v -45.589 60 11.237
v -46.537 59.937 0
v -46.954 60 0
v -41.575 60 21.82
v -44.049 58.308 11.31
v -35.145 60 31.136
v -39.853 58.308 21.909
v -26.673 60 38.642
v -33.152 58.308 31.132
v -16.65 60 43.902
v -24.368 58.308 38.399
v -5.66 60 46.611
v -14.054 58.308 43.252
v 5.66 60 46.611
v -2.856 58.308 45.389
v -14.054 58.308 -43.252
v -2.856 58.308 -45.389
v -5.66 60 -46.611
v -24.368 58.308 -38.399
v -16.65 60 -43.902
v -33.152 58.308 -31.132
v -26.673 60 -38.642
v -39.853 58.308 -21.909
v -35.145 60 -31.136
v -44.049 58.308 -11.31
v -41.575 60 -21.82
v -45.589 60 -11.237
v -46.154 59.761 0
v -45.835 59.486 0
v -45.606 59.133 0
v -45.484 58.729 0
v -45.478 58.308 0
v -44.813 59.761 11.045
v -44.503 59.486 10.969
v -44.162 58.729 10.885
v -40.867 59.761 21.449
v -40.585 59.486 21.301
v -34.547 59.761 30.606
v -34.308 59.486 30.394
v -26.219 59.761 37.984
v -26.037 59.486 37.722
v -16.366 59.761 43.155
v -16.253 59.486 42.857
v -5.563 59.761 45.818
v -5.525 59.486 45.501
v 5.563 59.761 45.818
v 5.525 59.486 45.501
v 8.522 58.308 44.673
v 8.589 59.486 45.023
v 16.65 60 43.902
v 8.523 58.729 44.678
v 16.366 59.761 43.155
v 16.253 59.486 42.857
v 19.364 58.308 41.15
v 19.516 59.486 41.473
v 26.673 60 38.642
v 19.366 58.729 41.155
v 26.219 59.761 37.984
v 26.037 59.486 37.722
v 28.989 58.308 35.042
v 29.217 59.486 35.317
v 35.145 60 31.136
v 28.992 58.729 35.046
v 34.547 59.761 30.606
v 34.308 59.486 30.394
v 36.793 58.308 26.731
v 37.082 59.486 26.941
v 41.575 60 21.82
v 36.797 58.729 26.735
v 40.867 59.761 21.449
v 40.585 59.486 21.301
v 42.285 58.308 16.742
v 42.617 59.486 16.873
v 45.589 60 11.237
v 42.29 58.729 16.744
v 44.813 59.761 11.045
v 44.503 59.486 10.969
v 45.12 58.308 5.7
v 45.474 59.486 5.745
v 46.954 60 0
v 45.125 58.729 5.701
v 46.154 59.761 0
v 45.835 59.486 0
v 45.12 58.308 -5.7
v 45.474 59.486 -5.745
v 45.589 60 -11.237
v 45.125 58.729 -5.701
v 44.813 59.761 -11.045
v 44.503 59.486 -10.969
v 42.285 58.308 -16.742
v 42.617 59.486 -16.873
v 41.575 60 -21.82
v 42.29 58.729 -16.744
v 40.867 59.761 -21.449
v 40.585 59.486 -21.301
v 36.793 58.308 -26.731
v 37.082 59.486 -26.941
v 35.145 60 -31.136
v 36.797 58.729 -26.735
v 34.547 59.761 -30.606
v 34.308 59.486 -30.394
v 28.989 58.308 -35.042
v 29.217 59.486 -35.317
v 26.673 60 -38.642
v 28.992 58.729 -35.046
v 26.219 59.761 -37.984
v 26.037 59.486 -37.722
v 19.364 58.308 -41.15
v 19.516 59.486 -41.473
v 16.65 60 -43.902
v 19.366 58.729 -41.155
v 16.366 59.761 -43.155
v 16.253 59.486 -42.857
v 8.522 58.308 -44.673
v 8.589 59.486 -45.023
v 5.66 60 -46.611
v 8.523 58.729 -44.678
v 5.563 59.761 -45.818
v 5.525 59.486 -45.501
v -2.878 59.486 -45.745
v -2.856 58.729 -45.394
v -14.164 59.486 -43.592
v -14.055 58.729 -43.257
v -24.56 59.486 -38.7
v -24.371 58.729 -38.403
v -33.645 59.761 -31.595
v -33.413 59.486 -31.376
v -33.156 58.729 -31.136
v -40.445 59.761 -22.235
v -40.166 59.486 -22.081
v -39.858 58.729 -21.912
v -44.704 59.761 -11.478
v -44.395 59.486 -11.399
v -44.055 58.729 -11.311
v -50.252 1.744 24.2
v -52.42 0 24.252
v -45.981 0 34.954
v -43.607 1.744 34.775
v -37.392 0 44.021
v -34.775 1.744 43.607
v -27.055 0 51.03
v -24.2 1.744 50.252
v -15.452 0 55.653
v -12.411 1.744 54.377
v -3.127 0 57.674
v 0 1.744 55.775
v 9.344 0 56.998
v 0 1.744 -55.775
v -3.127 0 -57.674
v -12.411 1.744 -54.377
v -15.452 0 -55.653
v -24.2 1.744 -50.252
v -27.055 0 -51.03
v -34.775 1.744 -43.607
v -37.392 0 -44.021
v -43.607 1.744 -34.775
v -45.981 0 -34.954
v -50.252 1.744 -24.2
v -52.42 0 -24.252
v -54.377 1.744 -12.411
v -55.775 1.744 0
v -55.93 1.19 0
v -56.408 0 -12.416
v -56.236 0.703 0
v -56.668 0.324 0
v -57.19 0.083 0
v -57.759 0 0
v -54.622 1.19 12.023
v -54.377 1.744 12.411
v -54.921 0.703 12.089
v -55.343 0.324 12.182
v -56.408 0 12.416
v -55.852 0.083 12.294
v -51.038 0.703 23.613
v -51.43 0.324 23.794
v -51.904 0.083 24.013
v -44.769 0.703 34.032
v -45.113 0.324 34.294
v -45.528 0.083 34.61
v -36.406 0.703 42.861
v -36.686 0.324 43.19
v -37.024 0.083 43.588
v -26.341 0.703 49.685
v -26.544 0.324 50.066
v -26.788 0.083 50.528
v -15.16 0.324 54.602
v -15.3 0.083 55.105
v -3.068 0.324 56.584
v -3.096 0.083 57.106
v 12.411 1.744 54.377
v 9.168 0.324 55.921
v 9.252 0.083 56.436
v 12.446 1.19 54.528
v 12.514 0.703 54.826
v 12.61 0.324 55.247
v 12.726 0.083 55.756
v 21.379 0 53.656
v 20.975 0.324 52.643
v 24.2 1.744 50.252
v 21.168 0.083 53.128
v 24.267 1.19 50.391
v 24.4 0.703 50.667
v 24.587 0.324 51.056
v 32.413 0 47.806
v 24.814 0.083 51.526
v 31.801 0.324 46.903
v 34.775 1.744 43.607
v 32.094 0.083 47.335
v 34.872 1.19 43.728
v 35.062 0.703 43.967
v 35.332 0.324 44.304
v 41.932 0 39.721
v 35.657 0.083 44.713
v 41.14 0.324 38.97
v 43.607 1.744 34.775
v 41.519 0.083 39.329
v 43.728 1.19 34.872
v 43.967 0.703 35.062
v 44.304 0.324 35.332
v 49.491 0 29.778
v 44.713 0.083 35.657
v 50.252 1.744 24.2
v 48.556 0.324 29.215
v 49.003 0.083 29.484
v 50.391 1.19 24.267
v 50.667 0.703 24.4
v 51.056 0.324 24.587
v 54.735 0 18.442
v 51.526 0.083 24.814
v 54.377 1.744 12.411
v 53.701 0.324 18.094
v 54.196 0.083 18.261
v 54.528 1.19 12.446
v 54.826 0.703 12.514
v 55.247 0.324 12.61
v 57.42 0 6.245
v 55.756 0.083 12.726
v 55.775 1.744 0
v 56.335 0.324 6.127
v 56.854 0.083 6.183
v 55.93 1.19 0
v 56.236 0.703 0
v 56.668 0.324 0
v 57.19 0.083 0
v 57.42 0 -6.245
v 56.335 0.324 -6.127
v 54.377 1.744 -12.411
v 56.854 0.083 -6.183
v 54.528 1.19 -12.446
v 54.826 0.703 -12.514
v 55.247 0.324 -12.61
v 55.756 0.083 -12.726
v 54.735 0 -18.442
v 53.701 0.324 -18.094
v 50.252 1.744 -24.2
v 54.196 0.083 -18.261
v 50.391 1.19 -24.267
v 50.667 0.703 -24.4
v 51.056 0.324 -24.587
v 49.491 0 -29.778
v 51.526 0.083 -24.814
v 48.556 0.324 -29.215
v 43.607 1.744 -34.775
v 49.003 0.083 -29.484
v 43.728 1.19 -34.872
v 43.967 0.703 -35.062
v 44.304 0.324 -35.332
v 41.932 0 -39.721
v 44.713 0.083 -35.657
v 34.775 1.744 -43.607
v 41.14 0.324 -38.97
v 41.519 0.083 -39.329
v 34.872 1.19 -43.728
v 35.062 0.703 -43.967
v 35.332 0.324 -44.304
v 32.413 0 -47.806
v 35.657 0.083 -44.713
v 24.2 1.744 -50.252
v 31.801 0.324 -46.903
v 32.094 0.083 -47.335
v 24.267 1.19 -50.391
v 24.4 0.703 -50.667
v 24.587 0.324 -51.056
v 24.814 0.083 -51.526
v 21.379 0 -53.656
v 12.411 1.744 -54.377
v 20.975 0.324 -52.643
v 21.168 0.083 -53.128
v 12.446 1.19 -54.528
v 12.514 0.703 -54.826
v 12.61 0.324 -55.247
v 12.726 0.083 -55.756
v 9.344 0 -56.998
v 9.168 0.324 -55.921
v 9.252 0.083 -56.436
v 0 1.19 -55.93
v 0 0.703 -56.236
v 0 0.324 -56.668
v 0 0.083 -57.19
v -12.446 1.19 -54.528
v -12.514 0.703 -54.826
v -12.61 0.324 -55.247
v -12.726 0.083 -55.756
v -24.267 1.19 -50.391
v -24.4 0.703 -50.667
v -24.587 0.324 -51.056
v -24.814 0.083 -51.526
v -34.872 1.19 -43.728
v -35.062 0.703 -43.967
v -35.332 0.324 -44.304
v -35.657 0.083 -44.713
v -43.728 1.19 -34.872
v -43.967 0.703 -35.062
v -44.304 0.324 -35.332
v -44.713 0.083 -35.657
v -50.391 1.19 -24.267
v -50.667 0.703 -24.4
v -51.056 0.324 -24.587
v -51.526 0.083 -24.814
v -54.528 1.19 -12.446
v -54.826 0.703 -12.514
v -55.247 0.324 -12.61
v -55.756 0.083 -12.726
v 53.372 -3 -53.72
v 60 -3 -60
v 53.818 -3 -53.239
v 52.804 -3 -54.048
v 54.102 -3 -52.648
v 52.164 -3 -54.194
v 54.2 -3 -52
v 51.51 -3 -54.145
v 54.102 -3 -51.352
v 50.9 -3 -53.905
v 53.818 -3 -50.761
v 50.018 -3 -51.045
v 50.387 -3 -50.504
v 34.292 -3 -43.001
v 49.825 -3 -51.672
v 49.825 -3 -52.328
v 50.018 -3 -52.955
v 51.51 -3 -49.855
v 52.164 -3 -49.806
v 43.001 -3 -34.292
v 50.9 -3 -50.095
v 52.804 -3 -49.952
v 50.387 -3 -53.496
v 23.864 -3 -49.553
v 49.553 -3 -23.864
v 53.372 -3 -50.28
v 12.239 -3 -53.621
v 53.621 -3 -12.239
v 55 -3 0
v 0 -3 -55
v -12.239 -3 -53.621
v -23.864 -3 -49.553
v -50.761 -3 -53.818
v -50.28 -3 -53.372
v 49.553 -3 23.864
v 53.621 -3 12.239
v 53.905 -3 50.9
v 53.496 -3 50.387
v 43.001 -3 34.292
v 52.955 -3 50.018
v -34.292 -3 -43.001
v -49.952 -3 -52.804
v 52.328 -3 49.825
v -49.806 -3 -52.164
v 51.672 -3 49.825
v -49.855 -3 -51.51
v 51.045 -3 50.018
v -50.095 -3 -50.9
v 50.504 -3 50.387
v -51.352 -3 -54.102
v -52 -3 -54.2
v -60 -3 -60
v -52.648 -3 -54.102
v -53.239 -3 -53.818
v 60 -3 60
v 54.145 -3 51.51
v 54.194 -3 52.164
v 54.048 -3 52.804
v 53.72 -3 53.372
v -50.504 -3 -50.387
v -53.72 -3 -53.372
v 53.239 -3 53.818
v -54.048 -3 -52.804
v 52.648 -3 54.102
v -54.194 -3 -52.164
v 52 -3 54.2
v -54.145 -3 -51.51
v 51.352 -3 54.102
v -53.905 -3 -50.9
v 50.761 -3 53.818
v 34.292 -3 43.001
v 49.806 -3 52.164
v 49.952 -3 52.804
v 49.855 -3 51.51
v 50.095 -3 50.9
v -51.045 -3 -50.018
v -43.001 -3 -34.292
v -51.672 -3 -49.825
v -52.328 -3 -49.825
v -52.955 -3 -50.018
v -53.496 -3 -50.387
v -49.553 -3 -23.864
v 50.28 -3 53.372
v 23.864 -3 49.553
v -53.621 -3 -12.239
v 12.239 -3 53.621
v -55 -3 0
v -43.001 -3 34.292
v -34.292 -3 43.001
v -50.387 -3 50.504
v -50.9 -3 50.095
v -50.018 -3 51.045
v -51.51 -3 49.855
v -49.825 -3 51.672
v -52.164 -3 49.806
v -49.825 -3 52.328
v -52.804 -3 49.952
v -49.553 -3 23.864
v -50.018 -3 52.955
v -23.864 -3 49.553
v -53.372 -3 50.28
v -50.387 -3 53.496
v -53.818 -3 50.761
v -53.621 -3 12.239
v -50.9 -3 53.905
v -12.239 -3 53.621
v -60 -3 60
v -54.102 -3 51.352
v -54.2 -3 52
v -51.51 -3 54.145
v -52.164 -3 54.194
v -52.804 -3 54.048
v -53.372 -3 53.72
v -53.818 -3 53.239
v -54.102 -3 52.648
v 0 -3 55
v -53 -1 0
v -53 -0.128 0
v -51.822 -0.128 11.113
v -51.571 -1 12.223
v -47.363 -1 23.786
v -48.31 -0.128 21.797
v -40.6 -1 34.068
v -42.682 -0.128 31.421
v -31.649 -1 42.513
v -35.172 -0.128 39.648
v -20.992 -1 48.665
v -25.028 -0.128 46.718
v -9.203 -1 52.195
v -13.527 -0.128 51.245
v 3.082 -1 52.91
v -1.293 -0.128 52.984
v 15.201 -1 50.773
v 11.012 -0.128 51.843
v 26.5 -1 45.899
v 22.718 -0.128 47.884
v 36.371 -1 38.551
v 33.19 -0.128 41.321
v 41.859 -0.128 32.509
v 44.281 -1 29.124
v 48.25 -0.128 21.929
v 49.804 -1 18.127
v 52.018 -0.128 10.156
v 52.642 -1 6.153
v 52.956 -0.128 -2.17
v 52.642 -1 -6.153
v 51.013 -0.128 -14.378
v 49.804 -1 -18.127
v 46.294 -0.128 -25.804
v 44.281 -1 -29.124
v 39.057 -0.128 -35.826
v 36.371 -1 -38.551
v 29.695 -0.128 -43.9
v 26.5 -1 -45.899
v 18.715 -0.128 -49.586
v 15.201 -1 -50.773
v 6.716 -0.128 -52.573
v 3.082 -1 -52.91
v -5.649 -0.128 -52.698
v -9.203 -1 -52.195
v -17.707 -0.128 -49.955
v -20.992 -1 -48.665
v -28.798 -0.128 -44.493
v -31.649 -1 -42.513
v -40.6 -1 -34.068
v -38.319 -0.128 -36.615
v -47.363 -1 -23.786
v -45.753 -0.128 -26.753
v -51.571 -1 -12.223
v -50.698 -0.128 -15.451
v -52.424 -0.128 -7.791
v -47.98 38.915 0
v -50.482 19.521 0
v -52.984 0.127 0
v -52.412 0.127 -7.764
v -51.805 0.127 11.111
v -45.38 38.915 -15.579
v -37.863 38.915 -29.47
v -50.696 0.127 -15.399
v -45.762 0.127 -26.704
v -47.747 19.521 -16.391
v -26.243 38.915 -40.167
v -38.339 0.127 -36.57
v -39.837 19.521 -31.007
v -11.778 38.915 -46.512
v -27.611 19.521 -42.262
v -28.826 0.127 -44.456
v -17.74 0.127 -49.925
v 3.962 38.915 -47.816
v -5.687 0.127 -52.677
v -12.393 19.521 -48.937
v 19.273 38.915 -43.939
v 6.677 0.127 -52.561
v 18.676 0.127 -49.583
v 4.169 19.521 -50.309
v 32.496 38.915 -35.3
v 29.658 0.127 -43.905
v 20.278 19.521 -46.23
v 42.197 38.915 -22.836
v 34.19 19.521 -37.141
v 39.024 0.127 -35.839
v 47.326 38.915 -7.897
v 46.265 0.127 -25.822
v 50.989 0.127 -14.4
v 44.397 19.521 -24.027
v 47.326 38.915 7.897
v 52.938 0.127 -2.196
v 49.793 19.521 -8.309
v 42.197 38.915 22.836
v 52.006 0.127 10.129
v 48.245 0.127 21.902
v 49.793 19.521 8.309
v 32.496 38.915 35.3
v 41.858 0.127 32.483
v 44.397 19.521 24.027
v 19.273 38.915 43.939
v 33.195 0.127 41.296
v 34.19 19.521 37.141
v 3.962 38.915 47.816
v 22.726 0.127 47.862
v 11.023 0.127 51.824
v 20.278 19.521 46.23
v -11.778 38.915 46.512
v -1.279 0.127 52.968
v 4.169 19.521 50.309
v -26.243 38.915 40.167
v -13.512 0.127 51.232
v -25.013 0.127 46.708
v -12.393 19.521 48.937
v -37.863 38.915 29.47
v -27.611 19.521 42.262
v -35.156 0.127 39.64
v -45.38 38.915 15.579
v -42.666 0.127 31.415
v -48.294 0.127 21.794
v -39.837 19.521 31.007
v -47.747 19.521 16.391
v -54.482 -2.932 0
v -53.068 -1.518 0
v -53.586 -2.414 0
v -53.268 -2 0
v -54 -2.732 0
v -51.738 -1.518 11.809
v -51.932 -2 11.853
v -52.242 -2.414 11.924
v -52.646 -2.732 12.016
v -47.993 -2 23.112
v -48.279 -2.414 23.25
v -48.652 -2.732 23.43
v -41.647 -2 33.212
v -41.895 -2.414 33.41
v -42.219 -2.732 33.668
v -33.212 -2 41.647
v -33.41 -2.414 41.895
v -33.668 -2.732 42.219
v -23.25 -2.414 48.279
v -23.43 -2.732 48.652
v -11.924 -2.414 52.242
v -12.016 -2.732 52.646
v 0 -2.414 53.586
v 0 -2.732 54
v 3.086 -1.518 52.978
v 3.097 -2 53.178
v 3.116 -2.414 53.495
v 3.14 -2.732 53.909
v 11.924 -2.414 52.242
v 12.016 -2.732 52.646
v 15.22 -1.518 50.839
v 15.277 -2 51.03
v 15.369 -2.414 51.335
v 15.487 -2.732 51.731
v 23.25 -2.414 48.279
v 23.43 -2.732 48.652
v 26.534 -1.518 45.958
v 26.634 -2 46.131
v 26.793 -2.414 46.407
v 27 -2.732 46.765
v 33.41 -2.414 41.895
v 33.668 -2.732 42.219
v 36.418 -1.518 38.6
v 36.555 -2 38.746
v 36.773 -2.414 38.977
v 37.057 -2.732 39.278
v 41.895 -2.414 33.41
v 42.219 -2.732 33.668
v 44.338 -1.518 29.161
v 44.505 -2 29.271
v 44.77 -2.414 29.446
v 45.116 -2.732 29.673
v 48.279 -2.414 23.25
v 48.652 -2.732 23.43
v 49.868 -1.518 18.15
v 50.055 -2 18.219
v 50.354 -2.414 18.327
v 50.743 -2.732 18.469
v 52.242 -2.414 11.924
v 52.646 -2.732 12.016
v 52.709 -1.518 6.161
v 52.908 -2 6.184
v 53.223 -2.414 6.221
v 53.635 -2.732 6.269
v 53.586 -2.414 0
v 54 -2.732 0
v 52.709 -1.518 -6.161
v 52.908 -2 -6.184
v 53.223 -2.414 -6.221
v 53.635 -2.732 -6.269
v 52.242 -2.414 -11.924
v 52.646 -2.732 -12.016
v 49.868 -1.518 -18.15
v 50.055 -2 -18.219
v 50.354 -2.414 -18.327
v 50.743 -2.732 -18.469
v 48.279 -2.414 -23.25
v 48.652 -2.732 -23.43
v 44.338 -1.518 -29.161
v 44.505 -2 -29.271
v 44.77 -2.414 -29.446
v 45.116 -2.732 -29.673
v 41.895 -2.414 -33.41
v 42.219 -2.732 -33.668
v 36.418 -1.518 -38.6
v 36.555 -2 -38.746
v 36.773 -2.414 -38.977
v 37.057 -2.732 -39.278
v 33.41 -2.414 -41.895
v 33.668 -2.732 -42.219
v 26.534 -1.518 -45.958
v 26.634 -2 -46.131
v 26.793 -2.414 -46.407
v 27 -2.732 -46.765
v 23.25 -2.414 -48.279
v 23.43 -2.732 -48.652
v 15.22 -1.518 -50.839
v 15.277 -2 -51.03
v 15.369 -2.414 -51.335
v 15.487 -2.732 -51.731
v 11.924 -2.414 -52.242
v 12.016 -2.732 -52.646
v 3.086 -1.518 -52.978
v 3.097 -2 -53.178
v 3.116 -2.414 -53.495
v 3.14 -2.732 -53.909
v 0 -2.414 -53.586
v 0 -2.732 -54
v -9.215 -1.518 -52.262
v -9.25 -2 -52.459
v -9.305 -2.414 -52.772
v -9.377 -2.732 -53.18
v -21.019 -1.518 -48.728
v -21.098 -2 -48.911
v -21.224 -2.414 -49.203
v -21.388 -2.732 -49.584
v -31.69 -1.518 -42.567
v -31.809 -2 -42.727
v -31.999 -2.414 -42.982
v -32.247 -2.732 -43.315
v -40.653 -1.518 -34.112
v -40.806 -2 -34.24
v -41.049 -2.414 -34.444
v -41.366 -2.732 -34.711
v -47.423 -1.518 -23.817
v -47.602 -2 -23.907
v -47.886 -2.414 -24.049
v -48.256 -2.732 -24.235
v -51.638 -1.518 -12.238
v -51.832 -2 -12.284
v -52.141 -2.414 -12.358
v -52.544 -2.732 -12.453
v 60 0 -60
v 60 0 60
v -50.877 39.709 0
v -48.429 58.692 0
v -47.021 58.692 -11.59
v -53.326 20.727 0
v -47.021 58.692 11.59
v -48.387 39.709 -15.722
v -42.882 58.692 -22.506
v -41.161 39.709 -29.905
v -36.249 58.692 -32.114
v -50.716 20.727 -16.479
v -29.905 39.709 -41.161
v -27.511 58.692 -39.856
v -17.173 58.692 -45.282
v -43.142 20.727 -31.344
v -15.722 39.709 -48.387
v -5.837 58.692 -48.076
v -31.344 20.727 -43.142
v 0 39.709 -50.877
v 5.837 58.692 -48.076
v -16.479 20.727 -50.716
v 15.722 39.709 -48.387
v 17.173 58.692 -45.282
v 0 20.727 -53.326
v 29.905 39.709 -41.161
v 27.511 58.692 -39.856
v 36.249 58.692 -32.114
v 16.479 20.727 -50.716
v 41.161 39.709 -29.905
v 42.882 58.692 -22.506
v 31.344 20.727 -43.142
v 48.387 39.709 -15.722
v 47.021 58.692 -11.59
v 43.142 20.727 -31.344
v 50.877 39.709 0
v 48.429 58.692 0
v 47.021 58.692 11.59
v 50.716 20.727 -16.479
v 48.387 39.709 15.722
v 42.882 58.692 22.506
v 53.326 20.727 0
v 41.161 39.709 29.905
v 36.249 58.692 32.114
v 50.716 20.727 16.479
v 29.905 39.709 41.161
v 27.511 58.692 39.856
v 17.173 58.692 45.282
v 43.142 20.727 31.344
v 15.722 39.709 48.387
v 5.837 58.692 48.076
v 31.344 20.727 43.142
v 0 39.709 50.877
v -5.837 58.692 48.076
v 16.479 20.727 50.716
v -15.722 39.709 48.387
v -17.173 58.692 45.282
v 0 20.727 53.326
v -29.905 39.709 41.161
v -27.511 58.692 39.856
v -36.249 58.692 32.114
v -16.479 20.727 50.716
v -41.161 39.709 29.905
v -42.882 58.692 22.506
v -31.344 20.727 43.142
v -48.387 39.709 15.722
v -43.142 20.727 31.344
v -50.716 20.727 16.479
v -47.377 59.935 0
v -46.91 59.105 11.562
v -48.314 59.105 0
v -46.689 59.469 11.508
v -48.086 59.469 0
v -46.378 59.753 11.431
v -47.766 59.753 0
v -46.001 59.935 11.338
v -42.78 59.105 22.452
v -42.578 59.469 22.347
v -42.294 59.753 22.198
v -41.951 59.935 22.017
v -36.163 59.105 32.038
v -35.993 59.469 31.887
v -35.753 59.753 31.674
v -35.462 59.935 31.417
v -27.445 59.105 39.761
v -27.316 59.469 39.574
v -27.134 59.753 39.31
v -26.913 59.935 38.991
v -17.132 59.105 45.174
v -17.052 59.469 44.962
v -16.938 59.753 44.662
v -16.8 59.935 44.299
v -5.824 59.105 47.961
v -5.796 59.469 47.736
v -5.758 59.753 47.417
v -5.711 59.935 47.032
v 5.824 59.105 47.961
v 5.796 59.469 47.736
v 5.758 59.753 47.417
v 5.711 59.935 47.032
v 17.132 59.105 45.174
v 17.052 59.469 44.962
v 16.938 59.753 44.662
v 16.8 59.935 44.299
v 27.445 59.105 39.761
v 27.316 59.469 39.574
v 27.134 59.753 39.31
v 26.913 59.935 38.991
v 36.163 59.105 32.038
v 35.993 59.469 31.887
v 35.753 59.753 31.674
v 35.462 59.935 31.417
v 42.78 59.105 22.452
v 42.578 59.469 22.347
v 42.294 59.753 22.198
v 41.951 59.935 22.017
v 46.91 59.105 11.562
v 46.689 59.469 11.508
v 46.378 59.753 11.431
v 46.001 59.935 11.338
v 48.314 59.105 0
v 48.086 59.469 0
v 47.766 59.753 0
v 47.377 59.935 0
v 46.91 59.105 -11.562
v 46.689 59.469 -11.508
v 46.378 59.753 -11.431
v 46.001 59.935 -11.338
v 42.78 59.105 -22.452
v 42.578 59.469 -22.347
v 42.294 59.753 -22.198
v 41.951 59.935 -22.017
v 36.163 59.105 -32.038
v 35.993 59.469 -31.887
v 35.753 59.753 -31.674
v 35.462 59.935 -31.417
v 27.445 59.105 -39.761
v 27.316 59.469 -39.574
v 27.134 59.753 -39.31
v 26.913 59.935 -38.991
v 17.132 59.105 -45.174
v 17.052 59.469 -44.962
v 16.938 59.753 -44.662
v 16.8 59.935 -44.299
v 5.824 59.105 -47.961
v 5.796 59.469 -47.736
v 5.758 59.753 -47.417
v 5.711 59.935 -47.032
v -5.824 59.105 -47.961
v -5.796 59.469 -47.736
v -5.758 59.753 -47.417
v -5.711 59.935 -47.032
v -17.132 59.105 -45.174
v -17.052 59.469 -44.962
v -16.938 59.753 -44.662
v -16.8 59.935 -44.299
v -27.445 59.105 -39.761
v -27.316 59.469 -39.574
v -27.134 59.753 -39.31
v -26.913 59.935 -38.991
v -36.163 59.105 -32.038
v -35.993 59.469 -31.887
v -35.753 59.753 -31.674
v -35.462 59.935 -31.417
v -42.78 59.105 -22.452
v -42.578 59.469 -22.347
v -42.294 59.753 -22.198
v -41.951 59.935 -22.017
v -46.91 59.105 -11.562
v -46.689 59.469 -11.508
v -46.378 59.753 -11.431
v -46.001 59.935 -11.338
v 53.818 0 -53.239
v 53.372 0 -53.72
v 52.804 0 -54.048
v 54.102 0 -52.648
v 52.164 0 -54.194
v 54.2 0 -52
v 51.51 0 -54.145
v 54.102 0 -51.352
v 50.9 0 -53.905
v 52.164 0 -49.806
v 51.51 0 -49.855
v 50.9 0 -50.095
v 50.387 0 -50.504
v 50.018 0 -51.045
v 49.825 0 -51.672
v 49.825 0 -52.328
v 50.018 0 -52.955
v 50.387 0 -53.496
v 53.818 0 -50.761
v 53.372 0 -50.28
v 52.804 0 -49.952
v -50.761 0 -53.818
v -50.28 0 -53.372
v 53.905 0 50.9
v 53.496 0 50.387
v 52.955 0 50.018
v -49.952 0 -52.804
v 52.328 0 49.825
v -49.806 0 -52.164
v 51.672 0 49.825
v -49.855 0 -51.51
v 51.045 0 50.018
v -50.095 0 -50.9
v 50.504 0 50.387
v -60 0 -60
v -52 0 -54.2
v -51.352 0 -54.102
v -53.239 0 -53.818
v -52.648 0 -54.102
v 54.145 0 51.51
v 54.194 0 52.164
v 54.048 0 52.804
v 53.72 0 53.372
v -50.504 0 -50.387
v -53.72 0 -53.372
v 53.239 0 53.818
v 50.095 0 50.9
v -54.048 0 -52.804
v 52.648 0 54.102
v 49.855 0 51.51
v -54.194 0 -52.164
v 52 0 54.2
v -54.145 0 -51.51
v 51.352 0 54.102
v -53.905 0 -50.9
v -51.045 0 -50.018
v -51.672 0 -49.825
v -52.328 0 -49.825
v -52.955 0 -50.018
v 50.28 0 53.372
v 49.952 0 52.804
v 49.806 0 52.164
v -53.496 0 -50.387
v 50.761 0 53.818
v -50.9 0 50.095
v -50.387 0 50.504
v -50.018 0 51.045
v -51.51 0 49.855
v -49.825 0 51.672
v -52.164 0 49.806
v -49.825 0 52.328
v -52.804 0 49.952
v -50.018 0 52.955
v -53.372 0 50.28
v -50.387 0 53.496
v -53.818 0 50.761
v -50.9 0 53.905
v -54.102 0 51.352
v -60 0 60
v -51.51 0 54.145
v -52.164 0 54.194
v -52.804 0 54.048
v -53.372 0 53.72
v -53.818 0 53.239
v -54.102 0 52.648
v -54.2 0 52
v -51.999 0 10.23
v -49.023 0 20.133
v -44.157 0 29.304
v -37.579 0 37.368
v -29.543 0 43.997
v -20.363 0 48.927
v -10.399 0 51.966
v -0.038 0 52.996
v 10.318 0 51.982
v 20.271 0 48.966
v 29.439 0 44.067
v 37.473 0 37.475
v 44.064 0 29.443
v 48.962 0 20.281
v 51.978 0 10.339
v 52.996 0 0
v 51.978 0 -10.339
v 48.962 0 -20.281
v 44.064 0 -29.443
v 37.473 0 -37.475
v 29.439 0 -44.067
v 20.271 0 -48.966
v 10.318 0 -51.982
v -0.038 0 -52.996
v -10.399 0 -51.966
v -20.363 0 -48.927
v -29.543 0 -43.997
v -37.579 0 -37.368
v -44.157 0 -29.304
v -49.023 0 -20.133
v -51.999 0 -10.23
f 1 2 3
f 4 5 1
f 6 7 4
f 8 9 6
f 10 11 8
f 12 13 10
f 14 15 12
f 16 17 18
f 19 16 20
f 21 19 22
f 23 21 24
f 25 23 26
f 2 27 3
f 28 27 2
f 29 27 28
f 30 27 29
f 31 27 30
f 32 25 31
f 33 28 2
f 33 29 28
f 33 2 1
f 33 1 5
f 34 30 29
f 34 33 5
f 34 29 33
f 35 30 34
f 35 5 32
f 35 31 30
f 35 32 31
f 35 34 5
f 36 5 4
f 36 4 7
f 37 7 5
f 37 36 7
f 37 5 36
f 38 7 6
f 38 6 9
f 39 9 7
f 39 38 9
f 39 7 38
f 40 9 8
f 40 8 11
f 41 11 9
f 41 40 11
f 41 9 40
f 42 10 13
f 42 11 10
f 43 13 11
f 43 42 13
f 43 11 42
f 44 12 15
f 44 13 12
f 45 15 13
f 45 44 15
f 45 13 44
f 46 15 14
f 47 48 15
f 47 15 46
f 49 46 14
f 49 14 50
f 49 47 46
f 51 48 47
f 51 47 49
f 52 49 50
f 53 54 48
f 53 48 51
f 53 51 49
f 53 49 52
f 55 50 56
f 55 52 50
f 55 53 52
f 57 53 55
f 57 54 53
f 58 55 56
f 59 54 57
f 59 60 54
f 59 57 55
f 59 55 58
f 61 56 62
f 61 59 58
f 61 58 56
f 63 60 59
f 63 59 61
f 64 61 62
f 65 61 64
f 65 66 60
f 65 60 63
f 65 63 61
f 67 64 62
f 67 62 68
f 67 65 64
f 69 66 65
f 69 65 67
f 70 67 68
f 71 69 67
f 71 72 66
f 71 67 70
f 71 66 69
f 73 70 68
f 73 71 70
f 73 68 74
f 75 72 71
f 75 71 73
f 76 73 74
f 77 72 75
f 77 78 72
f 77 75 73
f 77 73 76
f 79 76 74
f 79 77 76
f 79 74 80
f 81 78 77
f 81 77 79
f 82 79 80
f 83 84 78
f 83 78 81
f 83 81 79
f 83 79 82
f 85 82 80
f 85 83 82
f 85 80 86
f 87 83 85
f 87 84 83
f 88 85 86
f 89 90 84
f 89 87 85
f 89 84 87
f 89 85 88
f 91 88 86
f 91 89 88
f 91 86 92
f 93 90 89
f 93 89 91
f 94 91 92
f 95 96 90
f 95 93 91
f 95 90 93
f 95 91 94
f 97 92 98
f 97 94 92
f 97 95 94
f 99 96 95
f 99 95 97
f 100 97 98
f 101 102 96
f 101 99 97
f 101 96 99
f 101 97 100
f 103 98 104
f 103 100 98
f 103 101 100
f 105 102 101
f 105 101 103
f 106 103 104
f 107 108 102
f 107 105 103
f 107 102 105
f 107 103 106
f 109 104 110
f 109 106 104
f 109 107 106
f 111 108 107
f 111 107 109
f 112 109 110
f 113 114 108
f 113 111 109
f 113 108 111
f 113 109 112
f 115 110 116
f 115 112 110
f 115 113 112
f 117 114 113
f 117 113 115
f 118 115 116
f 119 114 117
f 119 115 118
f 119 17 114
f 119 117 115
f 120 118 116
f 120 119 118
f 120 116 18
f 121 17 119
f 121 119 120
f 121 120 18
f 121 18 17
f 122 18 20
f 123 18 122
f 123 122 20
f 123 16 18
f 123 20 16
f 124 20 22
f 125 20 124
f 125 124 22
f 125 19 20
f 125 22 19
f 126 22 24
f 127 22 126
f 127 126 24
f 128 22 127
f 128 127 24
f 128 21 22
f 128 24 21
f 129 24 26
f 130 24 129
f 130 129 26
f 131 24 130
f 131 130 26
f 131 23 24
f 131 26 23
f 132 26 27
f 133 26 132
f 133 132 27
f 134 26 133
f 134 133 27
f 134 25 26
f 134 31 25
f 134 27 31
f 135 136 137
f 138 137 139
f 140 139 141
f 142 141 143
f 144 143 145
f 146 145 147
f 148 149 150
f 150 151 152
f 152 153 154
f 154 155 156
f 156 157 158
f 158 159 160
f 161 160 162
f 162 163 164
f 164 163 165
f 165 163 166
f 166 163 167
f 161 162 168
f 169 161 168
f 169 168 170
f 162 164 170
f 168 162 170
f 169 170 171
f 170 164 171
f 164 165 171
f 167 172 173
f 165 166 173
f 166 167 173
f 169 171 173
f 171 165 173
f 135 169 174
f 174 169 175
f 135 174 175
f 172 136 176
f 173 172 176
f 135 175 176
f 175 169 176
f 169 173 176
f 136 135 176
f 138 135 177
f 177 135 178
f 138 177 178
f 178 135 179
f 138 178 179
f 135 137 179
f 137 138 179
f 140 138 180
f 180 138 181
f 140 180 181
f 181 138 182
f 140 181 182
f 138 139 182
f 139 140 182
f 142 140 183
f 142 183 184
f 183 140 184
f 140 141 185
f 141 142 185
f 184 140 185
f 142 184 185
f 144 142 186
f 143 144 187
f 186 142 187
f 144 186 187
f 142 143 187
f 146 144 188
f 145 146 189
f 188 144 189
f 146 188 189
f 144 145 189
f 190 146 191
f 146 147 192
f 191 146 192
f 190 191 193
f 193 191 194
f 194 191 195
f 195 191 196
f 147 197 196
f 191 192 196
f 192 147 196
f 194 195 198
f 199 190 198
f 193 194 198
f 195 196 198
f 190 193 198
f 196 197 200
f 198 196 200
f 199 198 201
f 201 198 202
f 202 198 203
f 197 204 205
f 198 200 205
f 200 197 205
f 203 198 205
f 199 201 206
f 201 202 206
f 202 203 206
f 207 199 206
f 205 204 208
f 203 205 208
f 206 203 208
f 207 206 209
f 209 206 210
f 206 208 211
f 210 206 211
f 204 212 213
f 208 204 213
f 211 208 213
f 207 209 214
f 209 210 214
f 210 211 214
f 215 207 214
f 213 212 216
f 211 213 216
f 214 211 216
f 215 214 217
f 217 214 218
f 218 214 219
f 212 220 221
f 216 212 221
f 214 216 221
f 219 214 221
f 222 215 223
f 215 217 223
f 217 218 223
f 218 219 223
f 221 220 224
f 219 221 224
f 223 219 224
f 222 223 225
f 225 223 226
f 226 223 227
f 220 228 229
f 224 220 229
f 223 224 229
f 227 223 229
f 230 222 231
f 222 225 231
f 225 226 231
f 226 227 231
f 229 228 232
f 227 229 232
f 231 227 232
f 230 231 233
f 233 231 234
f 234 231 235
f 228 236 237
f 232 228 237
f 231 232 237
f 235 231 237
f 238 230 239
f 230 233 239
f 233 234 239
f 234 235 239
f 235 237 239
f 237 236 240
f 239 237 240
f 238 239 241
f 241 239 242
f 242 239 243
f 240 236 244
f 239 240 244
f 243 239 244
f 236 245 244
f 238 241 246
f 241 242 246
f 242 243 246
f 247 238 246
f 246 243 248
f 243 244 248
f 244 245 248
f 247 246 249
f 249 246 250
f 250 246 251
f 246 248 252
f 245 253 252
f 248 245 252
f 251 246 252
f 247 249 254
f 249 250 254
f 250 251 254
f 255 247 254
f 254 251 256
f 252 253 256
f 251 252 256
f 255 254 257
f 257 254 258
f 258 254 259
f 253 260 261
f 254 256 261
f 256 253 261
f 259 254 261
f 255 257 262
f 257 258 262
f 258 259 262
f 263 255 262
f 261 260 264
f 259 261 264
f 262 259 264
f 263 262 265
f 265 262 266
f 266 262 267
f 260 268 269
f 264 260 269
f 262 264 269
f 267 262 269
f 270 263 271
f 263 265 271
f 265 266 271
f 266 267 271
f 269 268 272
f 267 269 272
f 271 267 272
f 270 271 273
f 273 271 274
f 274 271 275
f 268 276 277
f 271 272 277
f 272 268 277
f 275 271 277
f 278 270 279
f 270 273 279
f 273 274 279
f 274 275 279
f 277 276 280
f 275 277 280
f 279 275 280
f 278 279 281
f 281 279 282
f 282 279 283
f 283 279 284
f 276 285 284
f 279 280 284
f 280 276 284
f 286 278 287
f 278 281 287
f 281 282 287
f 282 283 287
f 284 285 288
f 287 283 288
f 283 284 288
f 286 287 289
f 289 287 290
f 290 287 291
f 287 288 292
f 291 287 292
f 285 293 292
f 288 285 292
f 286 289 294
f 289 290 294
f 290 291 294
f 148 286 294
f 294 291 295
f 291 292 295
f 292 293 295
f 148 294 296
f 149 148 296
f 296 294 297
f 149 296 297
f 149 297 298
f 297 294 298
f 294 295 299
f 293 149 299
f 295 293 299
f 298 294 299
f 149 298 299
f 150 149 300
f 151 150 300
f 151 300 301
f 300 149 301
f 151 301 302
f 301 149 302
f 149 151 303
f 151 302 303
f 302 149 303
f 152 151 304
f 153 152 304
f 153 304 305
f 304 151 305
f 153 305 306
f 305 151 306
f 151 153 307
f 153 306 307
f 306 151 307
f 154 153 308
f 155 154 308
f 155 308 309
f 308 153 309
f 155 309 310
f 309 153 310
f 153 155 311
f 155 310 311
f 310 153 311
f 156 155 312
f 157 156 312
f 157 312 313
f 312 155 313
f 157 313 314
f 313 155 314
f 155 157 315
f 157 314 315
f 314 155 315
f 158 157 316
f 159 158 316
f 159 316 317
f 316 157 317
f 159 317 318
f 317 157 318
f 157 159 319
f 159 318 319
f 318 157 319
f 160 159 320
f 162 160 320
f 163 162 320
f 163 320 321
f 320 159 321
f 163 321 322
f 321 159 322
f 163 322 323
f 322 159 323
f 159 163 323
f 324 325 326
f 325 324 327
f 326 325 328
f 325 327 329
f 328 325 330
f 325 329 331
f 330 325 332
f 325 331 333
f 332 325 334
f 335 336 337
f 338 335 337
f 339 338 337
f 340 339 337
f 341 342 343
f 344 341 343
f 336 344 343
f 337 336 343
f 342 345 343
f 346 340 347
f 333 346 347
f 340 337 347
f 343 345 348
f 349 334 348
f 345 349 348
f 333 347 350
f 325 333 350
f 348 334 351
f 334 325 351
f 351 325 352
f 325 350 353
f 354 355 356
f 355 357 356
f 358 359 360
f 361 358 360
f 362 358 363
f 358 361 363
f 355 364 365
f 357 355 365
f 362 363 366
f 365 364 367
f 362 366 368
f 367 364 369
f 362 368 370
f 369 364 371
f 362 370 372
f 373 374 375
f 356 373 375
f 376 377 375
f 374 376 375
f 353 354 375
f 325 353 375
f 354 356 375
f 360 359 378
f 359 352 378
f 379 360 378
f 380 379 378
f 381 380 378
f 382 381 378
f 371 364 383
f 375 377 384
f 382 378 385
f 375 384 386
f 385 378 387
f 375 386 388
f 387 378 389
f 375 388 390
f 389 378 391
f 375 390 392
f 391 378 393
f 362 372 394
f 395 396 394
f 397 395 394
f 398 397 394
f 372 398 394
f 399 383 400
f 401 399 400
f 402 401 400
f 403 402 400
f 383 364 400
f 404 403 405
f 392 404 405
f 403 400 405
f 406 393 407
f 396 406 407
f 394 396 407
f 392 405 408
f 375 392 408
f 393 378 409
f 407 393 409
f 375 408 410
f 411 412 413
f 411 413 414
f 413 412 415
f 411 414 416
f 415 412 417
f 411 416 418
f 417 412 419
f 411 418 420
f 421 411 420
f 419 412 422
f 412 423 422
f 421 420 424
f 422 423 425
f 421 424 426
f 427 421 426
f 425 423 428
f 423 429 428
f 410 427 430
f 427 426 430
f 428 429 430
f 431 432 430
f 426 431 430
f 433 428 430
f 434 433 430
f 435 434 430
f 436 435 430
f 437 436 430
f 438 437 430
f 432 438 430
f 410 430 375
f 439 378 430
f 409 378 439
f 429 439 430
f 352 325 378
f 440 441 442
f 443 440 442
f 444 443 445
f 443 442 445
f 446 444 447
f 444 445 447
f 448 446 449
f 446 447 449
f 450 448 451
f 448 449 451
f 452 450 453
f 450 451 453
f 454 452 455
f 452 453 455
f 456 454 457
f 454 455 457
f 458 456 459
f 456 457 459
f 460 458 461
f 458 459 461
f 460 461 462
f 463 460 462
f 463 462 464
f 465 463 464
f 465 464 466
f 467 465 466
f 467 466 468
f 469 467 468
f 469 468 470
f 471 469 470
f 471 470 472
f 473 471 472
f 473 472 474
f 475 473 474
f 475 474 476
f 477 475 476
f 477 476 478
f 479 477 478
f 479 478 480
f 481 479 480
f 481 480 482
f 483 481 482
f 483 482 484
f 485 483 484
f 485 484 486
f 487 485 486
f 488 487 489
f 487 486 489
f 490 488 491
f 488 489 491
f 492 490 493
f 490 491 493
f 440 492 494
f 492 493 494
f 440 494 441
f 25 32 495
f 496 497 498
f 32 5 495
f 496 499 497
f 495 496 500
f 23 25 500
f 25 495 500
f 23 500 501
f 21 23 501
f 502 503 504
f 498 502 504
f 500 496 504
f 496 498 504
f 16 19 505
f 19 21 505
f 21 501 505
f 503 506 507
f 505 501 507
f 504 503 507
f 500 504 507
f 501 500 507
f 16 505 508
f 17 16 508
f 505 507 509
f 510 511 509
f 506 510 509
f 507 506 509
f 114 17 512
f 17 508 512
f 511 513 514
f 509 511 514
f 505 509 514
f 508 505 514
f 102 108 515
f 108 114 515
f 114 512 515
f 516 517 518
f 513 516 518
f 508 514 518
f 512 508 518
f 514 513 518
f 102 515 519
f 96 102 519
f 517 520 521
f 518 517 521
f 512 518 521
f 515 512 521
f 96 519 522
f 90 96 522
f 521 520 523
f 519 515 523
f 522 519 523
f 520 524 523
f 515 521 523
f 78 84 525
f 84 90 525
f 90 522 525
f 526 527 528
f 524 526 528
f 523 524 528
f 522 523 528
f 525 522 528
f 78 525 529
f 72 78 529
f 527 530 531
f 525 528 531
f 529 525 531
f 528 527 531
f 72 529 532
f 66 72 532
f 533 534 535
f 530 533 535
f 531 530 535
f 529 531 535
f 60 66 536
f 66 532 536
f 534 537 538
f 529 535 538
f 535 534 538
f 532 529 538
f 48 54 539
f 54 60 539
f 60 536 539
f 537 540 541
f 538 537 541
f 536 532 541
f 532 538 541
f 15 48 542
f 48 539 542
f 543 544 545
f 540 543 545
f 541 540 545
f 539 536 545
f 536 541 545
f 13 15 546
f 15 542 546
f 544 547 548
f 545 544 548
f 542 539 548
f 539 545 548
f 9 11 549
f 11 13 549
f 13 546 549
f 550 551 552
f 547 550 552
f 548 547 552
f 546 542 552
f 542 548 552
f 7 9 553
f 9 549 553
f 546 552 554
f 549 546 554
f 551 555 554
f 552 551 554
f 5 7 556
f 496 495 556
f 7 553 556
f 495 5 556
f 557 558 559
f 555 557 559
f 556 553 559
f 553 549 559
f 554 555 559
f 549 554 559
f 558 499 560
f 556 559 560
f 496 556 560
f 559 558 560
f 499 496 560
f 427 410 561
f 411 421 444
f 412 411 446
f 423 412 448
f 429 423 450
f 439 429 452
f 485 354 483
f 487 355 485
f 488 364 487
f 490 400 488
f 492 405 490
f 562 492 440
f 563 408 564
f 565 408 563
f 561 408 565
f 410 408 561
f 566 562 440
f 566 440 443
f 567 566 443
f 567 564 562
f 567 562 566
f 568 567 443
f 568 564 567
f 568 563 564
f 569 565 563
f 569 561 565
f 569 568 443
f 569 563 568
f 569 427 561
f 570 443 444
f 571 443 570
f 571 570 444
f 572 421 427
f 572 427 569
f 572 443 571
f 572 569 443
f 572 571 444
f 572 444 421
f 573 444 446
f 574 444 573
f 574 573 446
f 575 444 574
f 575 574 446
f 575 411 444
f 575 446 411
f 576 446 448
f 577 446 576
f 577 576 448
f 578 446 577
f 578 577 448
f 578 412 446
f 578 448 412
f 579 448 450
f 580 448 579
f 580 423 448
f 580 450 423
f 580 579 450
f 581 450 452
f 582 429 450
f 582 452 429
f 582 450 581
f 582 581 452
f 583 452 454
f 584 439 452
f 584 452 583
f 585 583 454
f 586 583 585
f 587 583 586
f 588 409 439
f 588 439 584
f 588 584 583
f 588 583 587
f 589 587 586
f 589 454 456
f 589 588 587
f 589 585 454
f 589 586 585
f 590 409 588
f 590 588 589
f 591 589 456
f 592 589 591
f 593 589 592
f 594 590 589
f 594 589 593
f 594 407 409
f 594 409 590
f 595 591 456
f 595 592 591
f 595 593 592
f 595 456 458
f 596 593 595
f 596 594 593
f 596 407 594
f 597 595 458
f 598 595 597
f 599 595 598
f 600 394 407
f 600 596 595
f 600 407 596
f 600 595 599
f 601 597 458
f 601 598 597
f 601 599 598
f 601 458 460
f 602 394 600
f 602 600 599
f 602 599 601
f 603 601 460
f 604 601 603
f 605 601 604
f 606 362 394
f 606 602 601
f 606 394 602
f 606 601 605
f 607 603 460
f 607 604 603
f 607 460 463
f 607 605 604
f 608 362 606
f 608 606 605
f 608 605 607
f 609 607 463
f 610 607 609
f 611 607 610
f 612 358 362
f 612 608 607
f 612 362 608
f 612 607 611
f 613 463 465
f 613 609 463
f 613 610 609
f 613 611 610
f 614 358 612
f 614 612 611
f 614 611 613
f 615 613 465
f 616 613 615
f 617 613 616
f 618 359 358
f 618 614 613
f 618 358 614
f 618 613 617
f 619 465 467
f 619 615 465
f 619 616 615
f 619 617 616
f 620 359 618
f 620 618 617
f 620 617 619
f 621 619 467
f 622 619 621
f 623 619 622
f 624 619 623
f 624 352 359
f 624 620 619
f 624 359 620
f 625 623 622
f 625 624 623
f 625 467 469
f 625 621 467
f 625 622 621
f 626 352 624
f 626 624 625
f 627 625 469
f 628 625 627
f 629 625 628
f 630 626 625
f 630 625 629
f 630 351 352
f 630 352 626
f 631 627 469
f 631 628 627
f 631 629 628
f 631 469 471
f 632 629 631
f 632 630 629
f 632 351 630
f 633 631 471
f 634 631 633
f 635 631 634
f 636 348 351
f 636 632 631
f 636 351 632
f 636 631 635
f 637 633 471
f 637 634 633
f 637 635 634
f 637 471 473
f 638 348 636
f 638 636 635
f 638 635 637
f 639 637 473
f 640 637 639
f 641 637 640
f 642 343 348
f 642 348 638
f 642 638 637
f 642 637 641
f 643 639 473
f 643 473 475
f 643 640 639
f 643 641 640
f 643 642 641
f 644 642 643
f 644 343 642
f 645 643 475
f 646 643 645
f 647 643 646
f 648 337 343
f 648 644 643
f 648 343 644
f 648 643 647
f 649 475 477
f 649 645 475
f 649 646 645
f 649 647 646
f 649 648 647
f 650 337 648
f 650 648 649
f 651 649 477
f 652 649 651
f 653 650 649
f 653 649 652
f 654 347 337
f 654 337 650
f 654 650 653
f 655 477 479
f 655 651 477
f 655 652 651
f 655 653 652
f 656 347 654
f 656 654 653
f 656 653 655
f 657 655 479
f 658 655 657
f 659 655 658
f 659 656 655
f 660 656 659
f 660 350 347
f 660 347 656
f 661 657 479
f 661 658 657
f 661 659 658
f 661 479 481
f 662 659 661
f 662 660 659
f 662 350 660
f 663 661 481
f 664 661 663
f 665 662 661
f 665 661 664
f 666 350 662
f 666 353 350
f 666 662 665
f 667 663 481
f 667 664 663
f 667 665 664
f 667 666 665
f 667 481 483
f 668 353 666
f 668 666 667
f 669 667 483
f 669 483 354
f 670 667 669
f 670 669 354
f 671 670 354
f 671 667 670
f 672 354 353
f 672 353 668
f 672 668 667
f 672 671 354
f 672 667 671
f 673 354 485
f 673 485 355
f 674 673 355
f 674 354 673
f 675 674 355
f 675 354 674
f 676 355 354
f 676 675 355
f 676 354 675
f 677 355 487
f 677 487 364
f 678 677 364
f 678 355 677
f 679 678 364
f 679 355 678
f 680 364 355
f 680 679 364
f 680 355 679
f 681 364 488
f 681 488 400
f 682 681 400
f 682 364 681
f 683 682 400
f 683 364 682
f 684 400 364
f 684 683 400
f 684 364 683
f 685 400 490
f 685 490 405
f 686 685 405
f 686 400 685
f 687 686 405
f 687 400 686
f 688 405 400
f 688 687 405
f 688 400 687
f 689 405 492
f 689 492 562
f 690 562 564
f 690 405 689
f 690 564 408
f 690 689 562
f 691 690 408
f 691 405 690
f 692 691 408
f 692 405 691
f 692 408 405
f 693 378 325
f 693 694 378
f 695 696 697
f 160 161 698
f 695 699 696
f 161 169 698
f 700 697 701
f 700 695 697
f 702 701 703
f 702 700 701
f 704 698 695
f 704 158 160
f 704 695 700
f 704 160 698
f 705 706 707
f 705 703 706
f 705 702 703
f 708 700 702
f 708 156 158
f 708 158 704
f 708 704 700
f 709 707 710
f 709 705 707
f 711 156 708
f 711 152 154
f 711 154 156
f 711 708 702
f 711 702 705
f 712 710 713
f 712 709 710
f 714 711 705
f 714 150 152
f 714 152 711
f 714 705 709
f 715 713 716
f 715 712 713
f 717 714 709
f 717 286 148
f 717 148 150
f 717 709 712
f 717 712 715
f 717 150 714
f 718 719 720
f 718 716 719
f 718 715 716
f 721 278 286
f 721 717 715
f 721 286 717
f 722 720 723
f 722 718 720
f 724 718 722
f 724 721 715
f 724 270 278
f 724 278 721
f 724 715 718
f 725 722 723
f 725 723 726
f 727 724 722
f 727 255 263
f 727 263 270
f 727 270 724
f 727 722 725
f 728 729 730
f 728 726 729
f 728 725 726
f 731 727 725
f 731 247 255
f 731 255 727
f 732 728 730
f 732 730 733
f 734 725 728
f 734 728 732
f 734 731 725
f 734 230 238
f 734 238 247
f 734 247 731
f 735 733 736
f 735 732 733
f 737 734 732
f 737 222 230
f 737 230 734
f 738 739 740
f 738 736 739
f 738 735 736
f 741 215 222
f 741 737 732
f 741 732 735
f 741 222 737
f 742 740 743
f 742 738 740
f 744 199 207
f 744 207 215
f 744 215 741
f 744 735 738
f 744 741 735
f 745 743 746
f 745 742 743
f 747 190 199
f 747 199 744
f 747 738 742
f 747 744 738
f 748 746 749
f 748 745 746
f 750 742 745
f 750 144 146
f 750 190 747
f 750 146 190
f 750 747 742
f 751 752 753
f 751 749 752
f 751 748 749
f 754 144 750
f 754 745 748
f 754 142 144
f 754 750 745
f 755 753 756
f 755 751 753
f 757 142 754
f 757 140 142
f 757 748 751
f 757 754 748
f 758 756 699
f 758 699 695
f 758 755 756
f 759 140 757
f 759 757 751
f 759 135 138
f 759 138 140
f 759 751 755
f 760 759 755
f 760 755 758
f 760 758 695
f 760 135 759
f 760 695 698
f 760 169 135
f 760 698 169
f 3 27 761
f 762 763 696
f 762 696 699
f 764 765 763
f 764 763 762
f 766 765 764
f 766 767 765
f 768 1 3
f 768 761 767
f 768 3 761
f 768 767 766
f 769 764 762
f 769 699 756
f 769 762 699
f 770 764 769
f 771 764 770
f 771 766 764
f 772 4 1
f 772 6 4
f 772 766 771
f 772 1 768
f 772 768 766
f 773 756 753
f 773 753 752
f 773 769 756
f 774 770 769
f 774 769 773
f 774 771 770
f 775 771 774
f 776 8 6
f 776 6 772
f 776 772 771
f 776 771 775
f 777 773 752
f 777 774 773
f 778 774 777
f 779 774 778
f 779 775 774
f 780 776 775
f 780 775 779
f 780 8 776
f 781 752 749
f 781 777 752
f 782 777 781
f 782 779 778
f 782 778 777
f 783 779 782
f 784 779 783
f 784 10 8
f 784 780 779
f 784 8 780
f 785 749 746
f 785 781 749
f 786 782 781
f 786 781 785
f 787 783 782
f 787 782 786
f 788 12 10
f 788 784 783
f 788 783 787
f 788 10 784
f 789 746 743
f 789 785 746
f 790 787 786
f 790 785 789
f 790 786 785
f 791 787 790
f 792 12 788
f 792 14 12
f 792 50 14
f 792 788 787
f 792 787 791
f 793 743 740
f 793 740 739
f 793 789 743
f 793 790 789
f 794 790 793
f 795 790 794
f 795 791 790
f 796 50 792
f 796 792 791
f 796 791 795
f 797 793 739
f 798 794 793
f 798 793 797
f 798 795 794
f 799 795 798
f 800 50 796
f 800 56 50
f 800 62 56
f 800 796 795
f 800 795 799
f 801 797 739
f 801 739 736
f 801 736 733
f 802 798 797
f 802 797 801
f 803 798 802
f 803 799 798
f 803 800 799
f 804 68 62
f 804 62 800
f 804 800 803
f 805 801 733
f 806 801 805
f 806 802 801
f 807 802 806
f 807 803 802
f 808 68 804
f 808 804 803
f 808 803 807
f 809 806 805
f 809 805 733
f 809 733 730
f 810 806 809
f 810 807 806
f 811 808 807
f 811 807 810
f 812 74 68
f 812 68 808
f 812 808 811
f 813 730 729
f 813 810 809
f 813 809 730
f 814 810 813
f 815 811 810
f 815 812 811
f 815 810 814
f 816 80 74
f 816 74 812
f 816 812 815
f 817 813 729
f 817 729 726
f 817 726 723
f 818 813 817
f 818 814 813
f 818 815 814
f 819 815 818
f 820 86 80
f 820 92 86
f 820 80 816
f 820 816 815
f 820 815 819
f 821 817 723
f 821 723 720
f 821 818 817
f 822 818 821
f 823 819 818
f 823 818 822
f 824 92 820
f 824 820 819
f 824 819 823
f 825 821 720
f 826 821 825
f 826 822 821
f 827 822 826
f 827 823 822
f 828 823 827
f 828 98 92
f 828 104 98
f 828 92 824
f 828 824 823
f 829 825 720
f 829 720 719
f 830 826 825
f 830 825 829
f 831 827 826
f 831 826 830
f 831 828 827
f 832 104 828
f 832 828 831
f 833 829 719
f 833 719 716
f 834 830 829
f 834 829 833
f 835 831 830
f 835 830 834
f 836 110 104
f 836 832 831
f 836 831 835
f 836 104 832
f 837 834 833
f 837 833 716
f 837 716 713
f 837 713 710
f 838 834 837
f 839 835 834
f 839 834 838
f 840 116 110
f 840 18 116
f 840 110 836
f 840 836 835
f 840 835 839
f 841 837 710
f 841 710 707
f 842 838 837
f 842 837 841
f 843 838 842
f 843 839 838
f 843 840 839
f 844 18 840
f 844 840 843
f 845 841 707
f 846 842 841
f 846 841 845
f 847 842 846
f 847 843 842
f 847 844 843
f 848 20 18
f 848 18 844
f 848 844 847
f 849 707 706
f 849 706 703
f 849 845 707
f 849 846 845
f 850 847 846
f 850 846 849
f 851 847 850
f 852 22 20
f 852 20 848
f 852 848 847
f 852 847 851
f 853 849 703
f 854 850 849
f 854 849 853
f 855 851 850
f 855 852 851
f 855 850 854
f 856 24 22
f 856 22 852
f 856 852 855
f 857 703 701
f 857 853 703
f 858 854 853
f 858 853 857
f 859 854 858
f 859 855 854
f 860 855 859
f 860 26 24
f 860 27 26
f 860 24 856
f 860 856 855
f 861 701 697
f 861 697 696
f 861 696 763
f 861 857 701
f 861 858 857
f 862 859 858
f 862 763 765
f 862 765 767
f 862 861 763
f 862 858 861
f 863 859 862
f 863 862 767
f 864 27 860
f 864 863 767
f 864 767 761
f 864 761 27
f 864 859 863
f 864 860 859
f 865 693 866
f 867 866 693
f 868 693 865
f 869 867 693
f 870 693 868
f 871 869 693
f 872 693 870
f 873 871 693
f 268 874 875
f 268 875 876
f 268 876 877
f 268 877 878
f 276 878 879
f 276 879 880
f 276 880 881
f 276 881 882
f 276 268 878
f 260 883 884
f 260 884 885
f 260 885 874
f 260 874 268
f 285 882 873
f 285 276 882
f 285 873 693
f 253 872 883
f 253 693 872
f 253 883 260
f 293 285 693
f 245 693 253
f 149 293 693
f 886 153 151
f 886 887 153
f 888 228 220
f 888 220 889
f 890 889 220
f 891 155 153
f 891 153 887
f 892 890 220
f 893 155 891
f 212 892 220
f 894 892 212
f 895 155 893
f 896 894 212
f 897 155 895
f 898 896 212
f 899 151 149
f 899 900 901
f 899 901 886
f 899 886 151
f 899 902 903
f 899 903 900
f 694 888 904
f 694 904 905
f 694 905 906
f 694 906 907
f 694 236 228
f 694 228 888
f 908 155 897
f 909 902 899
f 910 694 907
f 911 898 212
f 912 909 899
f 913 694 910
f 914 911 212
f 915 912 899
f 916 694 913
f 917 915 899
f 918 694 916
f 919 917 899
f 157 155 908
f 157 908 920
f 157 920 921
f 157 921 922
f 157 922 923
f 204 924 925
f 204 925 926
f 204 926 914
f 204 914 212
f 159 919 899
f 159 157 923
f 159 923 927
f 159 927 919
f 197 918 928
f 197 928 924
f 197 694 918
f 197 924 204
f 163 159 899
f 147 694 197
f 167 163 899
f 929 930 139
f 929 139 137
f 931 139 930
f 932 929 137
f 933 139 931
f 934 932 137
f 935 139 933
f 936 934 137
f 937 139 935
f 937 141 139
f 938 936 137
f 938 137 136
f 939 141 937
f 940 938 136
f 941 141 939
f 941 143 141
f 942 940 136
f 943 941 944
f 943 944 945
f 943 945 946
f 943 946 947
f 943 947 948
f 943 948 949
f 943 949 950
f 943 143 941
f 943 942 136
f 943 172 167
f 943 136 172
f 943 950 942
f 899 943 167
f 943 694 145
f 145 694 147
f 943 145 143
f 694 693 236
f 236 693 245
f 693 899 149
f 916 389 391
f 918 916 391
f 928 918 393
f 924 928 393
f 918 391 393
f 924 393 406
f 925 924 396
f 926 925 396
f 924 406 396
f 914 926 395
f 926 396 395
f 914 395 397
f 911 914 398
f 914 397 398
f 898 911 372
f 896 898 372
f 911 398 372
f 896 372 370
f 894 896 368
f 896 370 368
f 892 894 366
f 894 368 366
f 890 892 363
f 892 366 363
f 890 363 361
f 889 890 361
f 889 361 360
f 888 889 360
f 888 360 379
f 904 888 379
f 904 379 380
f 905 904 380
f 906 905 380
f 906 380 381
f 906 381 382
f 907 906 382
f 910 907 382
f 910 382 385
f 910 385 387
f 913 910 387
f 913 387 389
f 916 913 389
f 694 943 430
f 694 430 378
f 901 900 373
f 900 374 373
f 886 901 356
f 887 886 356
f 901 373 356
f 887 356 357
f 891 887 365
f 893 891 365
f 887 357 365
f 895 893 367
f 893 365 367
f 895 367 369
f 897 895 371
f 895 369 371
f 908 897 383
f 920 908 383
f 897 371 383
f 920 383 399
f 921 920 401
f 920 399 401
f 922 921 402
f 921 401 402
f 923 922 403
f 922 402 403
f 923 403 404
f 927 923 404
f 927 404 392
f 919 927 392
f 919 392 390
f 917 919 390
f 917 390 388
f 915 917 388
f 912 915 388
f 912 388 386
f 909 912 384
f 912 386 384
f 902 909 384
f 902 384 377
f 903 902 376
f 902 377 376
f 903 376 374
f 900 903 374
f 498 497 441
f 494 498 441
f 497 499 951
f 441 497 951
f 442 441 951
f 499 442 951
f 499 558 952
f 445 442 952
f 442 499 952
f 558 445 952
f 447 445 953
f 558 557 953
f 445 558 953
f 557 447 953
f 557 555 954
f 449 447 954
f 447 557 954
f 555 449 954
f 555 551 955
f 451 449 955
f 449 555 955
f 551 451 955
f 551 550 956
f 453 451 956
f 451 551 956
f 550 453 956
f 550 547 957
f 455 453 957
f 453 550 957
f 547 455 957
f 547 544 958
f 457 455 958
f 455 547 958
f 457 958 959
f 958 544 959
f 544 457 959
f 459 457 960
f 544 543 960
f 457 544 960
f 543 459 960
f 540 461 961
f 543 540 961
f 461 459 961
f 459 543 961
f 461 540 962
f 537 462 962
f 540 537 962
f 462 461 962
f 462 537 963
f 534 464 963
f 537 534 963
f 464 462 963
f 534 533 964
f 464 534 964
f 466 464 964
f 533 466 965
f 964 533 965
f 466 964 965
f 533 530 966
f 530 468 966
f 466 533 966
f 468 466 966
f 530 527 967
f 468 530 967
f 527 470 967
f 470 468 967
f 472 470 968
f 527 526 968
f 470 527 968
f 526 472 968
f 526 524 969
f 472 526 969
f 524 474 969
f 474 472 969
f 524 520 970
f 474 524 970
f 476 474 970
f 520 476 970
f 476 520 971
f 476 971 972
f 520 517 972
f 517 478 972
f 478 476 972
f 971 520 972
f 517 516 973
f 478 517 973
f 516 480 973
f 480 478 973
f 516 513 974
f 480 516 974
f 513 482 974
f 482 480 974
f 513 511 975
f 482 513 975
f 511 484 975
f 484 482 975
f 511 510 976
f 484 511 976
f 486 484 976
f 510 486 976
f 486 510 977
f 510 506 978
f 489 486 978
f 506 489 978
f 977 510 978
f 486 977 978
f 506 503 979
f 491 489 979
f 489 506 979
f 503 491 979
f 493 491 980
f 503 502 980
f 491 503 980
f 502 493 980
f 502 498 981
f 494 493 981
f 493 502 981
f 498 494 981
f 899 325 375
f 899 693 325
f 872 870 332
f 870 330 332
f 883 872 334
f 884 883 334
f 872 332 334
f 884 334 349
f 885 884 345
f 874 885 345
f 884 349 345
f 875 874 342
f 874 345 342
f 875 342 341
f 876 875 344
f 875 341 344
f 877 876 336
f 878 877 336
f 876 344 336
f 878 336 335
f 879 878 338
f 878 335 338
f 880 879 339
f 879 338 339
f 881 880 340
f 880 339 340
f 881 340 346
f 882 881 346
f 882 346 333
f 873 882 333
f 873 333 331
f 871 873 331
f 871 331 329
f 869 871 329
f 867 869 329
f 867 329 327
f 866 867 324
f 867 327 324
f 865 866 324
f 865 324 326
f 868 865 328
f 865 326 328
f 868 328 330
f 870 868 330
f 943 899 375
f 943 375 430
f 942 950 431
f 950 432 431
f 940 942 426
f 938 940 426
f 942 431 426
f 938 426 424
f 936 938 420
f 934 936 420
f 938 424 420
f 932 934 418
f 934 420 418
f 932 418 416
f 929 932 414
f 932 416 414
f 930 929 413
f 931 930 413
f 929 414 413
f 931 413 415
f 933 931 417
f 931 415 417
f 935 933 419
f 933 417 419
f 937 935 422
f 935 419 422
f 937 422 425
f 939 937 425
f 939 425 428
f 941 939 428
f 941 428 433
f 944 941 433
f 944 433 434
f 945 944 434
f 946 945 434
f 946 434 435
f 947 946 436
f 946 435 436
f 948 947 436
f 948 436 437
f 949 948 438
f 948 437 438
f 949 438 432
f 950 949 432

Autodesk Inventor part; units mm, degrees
ref_plane "YZ Plane" through (0, 0, 0) normal (1, 0, 0) x (0, 1, 0)
ref_plane "XY Plane" through (0, 0, 0) normal (0, 0, 1) x (1, 0, 0)
sketch "Sketch1" plane through (0, 0, 0) normal (0, 1, 0) x (-1, 0, 0)
  line L0 (-60, -60) -> (60, -60)
  line L1 (60, -60) -> (60, 60)
  line L2 (60, 60) -> (-60, 60)
  line L3 (-60, 60) -> (-60, -60)
  line L4 (-60, -60) -> (60, 60) construction
  line L5 (60, -60) -> (-60, 60) construction
  circle A0 centre (0, 0) radius 56
  line L6 (0, 60) -> (0, 0) construction
  circle A1 centre (0, 0) radius 53
  point P0 (-52, 52)
  dimension "d0" = 120
  dimension "d1" = 120
  dimension "d2" = 112
  dimension "d4" = 104
  dimension "d29" = 3
extrude "Extrusion1" add sketch "Sketch1" against normal blind 3 contours L3 L2 L1 L0 | A0
hole "Hole1" at (52, 0, 52) direction (0, -1, 0) diameter 4.4 end through all
pattern_circular "Circular Pattern1" count 4 over 360 about axis through (0, -10, 0) along (0, 1, 0) of "Hole1"
ref_plane "Work Plane1" through (0, 60, 0) normal (0, 1, 0) x (-1, 0, 0)
sketch "Sketch3" plane through (0, 60, 0) normal (0, 1, 0) x (-1, 0, 0)
  circle A0 centre (0, 0) radius 48.26
  circle A1 centre (0, 0) radius 45.26
  dimension "d21" = 96.52
  dimension "WallThickness" = 3
loft "Loft1" add profiles "Sketch3", "Sketch1" contours A0 | A1 / A0 | A1
loft "Loft2" cut profiles "Sketch1", "Sketch3" contours A1 / A1
fillet "Fillet1" radius 2 3 edges at (56, 0, 0) (53, 0, 0) (53, -3, 0)
fillet "Fillet2" radius 1.5 2 edges at (48.26, 60, 0) (45.26, 60, 0)
equation "\"d29\" = WallThickness"
equation "\"d36\" = 0.5 * WallThickness"
properties part number "120mm-4in duct adapter"
